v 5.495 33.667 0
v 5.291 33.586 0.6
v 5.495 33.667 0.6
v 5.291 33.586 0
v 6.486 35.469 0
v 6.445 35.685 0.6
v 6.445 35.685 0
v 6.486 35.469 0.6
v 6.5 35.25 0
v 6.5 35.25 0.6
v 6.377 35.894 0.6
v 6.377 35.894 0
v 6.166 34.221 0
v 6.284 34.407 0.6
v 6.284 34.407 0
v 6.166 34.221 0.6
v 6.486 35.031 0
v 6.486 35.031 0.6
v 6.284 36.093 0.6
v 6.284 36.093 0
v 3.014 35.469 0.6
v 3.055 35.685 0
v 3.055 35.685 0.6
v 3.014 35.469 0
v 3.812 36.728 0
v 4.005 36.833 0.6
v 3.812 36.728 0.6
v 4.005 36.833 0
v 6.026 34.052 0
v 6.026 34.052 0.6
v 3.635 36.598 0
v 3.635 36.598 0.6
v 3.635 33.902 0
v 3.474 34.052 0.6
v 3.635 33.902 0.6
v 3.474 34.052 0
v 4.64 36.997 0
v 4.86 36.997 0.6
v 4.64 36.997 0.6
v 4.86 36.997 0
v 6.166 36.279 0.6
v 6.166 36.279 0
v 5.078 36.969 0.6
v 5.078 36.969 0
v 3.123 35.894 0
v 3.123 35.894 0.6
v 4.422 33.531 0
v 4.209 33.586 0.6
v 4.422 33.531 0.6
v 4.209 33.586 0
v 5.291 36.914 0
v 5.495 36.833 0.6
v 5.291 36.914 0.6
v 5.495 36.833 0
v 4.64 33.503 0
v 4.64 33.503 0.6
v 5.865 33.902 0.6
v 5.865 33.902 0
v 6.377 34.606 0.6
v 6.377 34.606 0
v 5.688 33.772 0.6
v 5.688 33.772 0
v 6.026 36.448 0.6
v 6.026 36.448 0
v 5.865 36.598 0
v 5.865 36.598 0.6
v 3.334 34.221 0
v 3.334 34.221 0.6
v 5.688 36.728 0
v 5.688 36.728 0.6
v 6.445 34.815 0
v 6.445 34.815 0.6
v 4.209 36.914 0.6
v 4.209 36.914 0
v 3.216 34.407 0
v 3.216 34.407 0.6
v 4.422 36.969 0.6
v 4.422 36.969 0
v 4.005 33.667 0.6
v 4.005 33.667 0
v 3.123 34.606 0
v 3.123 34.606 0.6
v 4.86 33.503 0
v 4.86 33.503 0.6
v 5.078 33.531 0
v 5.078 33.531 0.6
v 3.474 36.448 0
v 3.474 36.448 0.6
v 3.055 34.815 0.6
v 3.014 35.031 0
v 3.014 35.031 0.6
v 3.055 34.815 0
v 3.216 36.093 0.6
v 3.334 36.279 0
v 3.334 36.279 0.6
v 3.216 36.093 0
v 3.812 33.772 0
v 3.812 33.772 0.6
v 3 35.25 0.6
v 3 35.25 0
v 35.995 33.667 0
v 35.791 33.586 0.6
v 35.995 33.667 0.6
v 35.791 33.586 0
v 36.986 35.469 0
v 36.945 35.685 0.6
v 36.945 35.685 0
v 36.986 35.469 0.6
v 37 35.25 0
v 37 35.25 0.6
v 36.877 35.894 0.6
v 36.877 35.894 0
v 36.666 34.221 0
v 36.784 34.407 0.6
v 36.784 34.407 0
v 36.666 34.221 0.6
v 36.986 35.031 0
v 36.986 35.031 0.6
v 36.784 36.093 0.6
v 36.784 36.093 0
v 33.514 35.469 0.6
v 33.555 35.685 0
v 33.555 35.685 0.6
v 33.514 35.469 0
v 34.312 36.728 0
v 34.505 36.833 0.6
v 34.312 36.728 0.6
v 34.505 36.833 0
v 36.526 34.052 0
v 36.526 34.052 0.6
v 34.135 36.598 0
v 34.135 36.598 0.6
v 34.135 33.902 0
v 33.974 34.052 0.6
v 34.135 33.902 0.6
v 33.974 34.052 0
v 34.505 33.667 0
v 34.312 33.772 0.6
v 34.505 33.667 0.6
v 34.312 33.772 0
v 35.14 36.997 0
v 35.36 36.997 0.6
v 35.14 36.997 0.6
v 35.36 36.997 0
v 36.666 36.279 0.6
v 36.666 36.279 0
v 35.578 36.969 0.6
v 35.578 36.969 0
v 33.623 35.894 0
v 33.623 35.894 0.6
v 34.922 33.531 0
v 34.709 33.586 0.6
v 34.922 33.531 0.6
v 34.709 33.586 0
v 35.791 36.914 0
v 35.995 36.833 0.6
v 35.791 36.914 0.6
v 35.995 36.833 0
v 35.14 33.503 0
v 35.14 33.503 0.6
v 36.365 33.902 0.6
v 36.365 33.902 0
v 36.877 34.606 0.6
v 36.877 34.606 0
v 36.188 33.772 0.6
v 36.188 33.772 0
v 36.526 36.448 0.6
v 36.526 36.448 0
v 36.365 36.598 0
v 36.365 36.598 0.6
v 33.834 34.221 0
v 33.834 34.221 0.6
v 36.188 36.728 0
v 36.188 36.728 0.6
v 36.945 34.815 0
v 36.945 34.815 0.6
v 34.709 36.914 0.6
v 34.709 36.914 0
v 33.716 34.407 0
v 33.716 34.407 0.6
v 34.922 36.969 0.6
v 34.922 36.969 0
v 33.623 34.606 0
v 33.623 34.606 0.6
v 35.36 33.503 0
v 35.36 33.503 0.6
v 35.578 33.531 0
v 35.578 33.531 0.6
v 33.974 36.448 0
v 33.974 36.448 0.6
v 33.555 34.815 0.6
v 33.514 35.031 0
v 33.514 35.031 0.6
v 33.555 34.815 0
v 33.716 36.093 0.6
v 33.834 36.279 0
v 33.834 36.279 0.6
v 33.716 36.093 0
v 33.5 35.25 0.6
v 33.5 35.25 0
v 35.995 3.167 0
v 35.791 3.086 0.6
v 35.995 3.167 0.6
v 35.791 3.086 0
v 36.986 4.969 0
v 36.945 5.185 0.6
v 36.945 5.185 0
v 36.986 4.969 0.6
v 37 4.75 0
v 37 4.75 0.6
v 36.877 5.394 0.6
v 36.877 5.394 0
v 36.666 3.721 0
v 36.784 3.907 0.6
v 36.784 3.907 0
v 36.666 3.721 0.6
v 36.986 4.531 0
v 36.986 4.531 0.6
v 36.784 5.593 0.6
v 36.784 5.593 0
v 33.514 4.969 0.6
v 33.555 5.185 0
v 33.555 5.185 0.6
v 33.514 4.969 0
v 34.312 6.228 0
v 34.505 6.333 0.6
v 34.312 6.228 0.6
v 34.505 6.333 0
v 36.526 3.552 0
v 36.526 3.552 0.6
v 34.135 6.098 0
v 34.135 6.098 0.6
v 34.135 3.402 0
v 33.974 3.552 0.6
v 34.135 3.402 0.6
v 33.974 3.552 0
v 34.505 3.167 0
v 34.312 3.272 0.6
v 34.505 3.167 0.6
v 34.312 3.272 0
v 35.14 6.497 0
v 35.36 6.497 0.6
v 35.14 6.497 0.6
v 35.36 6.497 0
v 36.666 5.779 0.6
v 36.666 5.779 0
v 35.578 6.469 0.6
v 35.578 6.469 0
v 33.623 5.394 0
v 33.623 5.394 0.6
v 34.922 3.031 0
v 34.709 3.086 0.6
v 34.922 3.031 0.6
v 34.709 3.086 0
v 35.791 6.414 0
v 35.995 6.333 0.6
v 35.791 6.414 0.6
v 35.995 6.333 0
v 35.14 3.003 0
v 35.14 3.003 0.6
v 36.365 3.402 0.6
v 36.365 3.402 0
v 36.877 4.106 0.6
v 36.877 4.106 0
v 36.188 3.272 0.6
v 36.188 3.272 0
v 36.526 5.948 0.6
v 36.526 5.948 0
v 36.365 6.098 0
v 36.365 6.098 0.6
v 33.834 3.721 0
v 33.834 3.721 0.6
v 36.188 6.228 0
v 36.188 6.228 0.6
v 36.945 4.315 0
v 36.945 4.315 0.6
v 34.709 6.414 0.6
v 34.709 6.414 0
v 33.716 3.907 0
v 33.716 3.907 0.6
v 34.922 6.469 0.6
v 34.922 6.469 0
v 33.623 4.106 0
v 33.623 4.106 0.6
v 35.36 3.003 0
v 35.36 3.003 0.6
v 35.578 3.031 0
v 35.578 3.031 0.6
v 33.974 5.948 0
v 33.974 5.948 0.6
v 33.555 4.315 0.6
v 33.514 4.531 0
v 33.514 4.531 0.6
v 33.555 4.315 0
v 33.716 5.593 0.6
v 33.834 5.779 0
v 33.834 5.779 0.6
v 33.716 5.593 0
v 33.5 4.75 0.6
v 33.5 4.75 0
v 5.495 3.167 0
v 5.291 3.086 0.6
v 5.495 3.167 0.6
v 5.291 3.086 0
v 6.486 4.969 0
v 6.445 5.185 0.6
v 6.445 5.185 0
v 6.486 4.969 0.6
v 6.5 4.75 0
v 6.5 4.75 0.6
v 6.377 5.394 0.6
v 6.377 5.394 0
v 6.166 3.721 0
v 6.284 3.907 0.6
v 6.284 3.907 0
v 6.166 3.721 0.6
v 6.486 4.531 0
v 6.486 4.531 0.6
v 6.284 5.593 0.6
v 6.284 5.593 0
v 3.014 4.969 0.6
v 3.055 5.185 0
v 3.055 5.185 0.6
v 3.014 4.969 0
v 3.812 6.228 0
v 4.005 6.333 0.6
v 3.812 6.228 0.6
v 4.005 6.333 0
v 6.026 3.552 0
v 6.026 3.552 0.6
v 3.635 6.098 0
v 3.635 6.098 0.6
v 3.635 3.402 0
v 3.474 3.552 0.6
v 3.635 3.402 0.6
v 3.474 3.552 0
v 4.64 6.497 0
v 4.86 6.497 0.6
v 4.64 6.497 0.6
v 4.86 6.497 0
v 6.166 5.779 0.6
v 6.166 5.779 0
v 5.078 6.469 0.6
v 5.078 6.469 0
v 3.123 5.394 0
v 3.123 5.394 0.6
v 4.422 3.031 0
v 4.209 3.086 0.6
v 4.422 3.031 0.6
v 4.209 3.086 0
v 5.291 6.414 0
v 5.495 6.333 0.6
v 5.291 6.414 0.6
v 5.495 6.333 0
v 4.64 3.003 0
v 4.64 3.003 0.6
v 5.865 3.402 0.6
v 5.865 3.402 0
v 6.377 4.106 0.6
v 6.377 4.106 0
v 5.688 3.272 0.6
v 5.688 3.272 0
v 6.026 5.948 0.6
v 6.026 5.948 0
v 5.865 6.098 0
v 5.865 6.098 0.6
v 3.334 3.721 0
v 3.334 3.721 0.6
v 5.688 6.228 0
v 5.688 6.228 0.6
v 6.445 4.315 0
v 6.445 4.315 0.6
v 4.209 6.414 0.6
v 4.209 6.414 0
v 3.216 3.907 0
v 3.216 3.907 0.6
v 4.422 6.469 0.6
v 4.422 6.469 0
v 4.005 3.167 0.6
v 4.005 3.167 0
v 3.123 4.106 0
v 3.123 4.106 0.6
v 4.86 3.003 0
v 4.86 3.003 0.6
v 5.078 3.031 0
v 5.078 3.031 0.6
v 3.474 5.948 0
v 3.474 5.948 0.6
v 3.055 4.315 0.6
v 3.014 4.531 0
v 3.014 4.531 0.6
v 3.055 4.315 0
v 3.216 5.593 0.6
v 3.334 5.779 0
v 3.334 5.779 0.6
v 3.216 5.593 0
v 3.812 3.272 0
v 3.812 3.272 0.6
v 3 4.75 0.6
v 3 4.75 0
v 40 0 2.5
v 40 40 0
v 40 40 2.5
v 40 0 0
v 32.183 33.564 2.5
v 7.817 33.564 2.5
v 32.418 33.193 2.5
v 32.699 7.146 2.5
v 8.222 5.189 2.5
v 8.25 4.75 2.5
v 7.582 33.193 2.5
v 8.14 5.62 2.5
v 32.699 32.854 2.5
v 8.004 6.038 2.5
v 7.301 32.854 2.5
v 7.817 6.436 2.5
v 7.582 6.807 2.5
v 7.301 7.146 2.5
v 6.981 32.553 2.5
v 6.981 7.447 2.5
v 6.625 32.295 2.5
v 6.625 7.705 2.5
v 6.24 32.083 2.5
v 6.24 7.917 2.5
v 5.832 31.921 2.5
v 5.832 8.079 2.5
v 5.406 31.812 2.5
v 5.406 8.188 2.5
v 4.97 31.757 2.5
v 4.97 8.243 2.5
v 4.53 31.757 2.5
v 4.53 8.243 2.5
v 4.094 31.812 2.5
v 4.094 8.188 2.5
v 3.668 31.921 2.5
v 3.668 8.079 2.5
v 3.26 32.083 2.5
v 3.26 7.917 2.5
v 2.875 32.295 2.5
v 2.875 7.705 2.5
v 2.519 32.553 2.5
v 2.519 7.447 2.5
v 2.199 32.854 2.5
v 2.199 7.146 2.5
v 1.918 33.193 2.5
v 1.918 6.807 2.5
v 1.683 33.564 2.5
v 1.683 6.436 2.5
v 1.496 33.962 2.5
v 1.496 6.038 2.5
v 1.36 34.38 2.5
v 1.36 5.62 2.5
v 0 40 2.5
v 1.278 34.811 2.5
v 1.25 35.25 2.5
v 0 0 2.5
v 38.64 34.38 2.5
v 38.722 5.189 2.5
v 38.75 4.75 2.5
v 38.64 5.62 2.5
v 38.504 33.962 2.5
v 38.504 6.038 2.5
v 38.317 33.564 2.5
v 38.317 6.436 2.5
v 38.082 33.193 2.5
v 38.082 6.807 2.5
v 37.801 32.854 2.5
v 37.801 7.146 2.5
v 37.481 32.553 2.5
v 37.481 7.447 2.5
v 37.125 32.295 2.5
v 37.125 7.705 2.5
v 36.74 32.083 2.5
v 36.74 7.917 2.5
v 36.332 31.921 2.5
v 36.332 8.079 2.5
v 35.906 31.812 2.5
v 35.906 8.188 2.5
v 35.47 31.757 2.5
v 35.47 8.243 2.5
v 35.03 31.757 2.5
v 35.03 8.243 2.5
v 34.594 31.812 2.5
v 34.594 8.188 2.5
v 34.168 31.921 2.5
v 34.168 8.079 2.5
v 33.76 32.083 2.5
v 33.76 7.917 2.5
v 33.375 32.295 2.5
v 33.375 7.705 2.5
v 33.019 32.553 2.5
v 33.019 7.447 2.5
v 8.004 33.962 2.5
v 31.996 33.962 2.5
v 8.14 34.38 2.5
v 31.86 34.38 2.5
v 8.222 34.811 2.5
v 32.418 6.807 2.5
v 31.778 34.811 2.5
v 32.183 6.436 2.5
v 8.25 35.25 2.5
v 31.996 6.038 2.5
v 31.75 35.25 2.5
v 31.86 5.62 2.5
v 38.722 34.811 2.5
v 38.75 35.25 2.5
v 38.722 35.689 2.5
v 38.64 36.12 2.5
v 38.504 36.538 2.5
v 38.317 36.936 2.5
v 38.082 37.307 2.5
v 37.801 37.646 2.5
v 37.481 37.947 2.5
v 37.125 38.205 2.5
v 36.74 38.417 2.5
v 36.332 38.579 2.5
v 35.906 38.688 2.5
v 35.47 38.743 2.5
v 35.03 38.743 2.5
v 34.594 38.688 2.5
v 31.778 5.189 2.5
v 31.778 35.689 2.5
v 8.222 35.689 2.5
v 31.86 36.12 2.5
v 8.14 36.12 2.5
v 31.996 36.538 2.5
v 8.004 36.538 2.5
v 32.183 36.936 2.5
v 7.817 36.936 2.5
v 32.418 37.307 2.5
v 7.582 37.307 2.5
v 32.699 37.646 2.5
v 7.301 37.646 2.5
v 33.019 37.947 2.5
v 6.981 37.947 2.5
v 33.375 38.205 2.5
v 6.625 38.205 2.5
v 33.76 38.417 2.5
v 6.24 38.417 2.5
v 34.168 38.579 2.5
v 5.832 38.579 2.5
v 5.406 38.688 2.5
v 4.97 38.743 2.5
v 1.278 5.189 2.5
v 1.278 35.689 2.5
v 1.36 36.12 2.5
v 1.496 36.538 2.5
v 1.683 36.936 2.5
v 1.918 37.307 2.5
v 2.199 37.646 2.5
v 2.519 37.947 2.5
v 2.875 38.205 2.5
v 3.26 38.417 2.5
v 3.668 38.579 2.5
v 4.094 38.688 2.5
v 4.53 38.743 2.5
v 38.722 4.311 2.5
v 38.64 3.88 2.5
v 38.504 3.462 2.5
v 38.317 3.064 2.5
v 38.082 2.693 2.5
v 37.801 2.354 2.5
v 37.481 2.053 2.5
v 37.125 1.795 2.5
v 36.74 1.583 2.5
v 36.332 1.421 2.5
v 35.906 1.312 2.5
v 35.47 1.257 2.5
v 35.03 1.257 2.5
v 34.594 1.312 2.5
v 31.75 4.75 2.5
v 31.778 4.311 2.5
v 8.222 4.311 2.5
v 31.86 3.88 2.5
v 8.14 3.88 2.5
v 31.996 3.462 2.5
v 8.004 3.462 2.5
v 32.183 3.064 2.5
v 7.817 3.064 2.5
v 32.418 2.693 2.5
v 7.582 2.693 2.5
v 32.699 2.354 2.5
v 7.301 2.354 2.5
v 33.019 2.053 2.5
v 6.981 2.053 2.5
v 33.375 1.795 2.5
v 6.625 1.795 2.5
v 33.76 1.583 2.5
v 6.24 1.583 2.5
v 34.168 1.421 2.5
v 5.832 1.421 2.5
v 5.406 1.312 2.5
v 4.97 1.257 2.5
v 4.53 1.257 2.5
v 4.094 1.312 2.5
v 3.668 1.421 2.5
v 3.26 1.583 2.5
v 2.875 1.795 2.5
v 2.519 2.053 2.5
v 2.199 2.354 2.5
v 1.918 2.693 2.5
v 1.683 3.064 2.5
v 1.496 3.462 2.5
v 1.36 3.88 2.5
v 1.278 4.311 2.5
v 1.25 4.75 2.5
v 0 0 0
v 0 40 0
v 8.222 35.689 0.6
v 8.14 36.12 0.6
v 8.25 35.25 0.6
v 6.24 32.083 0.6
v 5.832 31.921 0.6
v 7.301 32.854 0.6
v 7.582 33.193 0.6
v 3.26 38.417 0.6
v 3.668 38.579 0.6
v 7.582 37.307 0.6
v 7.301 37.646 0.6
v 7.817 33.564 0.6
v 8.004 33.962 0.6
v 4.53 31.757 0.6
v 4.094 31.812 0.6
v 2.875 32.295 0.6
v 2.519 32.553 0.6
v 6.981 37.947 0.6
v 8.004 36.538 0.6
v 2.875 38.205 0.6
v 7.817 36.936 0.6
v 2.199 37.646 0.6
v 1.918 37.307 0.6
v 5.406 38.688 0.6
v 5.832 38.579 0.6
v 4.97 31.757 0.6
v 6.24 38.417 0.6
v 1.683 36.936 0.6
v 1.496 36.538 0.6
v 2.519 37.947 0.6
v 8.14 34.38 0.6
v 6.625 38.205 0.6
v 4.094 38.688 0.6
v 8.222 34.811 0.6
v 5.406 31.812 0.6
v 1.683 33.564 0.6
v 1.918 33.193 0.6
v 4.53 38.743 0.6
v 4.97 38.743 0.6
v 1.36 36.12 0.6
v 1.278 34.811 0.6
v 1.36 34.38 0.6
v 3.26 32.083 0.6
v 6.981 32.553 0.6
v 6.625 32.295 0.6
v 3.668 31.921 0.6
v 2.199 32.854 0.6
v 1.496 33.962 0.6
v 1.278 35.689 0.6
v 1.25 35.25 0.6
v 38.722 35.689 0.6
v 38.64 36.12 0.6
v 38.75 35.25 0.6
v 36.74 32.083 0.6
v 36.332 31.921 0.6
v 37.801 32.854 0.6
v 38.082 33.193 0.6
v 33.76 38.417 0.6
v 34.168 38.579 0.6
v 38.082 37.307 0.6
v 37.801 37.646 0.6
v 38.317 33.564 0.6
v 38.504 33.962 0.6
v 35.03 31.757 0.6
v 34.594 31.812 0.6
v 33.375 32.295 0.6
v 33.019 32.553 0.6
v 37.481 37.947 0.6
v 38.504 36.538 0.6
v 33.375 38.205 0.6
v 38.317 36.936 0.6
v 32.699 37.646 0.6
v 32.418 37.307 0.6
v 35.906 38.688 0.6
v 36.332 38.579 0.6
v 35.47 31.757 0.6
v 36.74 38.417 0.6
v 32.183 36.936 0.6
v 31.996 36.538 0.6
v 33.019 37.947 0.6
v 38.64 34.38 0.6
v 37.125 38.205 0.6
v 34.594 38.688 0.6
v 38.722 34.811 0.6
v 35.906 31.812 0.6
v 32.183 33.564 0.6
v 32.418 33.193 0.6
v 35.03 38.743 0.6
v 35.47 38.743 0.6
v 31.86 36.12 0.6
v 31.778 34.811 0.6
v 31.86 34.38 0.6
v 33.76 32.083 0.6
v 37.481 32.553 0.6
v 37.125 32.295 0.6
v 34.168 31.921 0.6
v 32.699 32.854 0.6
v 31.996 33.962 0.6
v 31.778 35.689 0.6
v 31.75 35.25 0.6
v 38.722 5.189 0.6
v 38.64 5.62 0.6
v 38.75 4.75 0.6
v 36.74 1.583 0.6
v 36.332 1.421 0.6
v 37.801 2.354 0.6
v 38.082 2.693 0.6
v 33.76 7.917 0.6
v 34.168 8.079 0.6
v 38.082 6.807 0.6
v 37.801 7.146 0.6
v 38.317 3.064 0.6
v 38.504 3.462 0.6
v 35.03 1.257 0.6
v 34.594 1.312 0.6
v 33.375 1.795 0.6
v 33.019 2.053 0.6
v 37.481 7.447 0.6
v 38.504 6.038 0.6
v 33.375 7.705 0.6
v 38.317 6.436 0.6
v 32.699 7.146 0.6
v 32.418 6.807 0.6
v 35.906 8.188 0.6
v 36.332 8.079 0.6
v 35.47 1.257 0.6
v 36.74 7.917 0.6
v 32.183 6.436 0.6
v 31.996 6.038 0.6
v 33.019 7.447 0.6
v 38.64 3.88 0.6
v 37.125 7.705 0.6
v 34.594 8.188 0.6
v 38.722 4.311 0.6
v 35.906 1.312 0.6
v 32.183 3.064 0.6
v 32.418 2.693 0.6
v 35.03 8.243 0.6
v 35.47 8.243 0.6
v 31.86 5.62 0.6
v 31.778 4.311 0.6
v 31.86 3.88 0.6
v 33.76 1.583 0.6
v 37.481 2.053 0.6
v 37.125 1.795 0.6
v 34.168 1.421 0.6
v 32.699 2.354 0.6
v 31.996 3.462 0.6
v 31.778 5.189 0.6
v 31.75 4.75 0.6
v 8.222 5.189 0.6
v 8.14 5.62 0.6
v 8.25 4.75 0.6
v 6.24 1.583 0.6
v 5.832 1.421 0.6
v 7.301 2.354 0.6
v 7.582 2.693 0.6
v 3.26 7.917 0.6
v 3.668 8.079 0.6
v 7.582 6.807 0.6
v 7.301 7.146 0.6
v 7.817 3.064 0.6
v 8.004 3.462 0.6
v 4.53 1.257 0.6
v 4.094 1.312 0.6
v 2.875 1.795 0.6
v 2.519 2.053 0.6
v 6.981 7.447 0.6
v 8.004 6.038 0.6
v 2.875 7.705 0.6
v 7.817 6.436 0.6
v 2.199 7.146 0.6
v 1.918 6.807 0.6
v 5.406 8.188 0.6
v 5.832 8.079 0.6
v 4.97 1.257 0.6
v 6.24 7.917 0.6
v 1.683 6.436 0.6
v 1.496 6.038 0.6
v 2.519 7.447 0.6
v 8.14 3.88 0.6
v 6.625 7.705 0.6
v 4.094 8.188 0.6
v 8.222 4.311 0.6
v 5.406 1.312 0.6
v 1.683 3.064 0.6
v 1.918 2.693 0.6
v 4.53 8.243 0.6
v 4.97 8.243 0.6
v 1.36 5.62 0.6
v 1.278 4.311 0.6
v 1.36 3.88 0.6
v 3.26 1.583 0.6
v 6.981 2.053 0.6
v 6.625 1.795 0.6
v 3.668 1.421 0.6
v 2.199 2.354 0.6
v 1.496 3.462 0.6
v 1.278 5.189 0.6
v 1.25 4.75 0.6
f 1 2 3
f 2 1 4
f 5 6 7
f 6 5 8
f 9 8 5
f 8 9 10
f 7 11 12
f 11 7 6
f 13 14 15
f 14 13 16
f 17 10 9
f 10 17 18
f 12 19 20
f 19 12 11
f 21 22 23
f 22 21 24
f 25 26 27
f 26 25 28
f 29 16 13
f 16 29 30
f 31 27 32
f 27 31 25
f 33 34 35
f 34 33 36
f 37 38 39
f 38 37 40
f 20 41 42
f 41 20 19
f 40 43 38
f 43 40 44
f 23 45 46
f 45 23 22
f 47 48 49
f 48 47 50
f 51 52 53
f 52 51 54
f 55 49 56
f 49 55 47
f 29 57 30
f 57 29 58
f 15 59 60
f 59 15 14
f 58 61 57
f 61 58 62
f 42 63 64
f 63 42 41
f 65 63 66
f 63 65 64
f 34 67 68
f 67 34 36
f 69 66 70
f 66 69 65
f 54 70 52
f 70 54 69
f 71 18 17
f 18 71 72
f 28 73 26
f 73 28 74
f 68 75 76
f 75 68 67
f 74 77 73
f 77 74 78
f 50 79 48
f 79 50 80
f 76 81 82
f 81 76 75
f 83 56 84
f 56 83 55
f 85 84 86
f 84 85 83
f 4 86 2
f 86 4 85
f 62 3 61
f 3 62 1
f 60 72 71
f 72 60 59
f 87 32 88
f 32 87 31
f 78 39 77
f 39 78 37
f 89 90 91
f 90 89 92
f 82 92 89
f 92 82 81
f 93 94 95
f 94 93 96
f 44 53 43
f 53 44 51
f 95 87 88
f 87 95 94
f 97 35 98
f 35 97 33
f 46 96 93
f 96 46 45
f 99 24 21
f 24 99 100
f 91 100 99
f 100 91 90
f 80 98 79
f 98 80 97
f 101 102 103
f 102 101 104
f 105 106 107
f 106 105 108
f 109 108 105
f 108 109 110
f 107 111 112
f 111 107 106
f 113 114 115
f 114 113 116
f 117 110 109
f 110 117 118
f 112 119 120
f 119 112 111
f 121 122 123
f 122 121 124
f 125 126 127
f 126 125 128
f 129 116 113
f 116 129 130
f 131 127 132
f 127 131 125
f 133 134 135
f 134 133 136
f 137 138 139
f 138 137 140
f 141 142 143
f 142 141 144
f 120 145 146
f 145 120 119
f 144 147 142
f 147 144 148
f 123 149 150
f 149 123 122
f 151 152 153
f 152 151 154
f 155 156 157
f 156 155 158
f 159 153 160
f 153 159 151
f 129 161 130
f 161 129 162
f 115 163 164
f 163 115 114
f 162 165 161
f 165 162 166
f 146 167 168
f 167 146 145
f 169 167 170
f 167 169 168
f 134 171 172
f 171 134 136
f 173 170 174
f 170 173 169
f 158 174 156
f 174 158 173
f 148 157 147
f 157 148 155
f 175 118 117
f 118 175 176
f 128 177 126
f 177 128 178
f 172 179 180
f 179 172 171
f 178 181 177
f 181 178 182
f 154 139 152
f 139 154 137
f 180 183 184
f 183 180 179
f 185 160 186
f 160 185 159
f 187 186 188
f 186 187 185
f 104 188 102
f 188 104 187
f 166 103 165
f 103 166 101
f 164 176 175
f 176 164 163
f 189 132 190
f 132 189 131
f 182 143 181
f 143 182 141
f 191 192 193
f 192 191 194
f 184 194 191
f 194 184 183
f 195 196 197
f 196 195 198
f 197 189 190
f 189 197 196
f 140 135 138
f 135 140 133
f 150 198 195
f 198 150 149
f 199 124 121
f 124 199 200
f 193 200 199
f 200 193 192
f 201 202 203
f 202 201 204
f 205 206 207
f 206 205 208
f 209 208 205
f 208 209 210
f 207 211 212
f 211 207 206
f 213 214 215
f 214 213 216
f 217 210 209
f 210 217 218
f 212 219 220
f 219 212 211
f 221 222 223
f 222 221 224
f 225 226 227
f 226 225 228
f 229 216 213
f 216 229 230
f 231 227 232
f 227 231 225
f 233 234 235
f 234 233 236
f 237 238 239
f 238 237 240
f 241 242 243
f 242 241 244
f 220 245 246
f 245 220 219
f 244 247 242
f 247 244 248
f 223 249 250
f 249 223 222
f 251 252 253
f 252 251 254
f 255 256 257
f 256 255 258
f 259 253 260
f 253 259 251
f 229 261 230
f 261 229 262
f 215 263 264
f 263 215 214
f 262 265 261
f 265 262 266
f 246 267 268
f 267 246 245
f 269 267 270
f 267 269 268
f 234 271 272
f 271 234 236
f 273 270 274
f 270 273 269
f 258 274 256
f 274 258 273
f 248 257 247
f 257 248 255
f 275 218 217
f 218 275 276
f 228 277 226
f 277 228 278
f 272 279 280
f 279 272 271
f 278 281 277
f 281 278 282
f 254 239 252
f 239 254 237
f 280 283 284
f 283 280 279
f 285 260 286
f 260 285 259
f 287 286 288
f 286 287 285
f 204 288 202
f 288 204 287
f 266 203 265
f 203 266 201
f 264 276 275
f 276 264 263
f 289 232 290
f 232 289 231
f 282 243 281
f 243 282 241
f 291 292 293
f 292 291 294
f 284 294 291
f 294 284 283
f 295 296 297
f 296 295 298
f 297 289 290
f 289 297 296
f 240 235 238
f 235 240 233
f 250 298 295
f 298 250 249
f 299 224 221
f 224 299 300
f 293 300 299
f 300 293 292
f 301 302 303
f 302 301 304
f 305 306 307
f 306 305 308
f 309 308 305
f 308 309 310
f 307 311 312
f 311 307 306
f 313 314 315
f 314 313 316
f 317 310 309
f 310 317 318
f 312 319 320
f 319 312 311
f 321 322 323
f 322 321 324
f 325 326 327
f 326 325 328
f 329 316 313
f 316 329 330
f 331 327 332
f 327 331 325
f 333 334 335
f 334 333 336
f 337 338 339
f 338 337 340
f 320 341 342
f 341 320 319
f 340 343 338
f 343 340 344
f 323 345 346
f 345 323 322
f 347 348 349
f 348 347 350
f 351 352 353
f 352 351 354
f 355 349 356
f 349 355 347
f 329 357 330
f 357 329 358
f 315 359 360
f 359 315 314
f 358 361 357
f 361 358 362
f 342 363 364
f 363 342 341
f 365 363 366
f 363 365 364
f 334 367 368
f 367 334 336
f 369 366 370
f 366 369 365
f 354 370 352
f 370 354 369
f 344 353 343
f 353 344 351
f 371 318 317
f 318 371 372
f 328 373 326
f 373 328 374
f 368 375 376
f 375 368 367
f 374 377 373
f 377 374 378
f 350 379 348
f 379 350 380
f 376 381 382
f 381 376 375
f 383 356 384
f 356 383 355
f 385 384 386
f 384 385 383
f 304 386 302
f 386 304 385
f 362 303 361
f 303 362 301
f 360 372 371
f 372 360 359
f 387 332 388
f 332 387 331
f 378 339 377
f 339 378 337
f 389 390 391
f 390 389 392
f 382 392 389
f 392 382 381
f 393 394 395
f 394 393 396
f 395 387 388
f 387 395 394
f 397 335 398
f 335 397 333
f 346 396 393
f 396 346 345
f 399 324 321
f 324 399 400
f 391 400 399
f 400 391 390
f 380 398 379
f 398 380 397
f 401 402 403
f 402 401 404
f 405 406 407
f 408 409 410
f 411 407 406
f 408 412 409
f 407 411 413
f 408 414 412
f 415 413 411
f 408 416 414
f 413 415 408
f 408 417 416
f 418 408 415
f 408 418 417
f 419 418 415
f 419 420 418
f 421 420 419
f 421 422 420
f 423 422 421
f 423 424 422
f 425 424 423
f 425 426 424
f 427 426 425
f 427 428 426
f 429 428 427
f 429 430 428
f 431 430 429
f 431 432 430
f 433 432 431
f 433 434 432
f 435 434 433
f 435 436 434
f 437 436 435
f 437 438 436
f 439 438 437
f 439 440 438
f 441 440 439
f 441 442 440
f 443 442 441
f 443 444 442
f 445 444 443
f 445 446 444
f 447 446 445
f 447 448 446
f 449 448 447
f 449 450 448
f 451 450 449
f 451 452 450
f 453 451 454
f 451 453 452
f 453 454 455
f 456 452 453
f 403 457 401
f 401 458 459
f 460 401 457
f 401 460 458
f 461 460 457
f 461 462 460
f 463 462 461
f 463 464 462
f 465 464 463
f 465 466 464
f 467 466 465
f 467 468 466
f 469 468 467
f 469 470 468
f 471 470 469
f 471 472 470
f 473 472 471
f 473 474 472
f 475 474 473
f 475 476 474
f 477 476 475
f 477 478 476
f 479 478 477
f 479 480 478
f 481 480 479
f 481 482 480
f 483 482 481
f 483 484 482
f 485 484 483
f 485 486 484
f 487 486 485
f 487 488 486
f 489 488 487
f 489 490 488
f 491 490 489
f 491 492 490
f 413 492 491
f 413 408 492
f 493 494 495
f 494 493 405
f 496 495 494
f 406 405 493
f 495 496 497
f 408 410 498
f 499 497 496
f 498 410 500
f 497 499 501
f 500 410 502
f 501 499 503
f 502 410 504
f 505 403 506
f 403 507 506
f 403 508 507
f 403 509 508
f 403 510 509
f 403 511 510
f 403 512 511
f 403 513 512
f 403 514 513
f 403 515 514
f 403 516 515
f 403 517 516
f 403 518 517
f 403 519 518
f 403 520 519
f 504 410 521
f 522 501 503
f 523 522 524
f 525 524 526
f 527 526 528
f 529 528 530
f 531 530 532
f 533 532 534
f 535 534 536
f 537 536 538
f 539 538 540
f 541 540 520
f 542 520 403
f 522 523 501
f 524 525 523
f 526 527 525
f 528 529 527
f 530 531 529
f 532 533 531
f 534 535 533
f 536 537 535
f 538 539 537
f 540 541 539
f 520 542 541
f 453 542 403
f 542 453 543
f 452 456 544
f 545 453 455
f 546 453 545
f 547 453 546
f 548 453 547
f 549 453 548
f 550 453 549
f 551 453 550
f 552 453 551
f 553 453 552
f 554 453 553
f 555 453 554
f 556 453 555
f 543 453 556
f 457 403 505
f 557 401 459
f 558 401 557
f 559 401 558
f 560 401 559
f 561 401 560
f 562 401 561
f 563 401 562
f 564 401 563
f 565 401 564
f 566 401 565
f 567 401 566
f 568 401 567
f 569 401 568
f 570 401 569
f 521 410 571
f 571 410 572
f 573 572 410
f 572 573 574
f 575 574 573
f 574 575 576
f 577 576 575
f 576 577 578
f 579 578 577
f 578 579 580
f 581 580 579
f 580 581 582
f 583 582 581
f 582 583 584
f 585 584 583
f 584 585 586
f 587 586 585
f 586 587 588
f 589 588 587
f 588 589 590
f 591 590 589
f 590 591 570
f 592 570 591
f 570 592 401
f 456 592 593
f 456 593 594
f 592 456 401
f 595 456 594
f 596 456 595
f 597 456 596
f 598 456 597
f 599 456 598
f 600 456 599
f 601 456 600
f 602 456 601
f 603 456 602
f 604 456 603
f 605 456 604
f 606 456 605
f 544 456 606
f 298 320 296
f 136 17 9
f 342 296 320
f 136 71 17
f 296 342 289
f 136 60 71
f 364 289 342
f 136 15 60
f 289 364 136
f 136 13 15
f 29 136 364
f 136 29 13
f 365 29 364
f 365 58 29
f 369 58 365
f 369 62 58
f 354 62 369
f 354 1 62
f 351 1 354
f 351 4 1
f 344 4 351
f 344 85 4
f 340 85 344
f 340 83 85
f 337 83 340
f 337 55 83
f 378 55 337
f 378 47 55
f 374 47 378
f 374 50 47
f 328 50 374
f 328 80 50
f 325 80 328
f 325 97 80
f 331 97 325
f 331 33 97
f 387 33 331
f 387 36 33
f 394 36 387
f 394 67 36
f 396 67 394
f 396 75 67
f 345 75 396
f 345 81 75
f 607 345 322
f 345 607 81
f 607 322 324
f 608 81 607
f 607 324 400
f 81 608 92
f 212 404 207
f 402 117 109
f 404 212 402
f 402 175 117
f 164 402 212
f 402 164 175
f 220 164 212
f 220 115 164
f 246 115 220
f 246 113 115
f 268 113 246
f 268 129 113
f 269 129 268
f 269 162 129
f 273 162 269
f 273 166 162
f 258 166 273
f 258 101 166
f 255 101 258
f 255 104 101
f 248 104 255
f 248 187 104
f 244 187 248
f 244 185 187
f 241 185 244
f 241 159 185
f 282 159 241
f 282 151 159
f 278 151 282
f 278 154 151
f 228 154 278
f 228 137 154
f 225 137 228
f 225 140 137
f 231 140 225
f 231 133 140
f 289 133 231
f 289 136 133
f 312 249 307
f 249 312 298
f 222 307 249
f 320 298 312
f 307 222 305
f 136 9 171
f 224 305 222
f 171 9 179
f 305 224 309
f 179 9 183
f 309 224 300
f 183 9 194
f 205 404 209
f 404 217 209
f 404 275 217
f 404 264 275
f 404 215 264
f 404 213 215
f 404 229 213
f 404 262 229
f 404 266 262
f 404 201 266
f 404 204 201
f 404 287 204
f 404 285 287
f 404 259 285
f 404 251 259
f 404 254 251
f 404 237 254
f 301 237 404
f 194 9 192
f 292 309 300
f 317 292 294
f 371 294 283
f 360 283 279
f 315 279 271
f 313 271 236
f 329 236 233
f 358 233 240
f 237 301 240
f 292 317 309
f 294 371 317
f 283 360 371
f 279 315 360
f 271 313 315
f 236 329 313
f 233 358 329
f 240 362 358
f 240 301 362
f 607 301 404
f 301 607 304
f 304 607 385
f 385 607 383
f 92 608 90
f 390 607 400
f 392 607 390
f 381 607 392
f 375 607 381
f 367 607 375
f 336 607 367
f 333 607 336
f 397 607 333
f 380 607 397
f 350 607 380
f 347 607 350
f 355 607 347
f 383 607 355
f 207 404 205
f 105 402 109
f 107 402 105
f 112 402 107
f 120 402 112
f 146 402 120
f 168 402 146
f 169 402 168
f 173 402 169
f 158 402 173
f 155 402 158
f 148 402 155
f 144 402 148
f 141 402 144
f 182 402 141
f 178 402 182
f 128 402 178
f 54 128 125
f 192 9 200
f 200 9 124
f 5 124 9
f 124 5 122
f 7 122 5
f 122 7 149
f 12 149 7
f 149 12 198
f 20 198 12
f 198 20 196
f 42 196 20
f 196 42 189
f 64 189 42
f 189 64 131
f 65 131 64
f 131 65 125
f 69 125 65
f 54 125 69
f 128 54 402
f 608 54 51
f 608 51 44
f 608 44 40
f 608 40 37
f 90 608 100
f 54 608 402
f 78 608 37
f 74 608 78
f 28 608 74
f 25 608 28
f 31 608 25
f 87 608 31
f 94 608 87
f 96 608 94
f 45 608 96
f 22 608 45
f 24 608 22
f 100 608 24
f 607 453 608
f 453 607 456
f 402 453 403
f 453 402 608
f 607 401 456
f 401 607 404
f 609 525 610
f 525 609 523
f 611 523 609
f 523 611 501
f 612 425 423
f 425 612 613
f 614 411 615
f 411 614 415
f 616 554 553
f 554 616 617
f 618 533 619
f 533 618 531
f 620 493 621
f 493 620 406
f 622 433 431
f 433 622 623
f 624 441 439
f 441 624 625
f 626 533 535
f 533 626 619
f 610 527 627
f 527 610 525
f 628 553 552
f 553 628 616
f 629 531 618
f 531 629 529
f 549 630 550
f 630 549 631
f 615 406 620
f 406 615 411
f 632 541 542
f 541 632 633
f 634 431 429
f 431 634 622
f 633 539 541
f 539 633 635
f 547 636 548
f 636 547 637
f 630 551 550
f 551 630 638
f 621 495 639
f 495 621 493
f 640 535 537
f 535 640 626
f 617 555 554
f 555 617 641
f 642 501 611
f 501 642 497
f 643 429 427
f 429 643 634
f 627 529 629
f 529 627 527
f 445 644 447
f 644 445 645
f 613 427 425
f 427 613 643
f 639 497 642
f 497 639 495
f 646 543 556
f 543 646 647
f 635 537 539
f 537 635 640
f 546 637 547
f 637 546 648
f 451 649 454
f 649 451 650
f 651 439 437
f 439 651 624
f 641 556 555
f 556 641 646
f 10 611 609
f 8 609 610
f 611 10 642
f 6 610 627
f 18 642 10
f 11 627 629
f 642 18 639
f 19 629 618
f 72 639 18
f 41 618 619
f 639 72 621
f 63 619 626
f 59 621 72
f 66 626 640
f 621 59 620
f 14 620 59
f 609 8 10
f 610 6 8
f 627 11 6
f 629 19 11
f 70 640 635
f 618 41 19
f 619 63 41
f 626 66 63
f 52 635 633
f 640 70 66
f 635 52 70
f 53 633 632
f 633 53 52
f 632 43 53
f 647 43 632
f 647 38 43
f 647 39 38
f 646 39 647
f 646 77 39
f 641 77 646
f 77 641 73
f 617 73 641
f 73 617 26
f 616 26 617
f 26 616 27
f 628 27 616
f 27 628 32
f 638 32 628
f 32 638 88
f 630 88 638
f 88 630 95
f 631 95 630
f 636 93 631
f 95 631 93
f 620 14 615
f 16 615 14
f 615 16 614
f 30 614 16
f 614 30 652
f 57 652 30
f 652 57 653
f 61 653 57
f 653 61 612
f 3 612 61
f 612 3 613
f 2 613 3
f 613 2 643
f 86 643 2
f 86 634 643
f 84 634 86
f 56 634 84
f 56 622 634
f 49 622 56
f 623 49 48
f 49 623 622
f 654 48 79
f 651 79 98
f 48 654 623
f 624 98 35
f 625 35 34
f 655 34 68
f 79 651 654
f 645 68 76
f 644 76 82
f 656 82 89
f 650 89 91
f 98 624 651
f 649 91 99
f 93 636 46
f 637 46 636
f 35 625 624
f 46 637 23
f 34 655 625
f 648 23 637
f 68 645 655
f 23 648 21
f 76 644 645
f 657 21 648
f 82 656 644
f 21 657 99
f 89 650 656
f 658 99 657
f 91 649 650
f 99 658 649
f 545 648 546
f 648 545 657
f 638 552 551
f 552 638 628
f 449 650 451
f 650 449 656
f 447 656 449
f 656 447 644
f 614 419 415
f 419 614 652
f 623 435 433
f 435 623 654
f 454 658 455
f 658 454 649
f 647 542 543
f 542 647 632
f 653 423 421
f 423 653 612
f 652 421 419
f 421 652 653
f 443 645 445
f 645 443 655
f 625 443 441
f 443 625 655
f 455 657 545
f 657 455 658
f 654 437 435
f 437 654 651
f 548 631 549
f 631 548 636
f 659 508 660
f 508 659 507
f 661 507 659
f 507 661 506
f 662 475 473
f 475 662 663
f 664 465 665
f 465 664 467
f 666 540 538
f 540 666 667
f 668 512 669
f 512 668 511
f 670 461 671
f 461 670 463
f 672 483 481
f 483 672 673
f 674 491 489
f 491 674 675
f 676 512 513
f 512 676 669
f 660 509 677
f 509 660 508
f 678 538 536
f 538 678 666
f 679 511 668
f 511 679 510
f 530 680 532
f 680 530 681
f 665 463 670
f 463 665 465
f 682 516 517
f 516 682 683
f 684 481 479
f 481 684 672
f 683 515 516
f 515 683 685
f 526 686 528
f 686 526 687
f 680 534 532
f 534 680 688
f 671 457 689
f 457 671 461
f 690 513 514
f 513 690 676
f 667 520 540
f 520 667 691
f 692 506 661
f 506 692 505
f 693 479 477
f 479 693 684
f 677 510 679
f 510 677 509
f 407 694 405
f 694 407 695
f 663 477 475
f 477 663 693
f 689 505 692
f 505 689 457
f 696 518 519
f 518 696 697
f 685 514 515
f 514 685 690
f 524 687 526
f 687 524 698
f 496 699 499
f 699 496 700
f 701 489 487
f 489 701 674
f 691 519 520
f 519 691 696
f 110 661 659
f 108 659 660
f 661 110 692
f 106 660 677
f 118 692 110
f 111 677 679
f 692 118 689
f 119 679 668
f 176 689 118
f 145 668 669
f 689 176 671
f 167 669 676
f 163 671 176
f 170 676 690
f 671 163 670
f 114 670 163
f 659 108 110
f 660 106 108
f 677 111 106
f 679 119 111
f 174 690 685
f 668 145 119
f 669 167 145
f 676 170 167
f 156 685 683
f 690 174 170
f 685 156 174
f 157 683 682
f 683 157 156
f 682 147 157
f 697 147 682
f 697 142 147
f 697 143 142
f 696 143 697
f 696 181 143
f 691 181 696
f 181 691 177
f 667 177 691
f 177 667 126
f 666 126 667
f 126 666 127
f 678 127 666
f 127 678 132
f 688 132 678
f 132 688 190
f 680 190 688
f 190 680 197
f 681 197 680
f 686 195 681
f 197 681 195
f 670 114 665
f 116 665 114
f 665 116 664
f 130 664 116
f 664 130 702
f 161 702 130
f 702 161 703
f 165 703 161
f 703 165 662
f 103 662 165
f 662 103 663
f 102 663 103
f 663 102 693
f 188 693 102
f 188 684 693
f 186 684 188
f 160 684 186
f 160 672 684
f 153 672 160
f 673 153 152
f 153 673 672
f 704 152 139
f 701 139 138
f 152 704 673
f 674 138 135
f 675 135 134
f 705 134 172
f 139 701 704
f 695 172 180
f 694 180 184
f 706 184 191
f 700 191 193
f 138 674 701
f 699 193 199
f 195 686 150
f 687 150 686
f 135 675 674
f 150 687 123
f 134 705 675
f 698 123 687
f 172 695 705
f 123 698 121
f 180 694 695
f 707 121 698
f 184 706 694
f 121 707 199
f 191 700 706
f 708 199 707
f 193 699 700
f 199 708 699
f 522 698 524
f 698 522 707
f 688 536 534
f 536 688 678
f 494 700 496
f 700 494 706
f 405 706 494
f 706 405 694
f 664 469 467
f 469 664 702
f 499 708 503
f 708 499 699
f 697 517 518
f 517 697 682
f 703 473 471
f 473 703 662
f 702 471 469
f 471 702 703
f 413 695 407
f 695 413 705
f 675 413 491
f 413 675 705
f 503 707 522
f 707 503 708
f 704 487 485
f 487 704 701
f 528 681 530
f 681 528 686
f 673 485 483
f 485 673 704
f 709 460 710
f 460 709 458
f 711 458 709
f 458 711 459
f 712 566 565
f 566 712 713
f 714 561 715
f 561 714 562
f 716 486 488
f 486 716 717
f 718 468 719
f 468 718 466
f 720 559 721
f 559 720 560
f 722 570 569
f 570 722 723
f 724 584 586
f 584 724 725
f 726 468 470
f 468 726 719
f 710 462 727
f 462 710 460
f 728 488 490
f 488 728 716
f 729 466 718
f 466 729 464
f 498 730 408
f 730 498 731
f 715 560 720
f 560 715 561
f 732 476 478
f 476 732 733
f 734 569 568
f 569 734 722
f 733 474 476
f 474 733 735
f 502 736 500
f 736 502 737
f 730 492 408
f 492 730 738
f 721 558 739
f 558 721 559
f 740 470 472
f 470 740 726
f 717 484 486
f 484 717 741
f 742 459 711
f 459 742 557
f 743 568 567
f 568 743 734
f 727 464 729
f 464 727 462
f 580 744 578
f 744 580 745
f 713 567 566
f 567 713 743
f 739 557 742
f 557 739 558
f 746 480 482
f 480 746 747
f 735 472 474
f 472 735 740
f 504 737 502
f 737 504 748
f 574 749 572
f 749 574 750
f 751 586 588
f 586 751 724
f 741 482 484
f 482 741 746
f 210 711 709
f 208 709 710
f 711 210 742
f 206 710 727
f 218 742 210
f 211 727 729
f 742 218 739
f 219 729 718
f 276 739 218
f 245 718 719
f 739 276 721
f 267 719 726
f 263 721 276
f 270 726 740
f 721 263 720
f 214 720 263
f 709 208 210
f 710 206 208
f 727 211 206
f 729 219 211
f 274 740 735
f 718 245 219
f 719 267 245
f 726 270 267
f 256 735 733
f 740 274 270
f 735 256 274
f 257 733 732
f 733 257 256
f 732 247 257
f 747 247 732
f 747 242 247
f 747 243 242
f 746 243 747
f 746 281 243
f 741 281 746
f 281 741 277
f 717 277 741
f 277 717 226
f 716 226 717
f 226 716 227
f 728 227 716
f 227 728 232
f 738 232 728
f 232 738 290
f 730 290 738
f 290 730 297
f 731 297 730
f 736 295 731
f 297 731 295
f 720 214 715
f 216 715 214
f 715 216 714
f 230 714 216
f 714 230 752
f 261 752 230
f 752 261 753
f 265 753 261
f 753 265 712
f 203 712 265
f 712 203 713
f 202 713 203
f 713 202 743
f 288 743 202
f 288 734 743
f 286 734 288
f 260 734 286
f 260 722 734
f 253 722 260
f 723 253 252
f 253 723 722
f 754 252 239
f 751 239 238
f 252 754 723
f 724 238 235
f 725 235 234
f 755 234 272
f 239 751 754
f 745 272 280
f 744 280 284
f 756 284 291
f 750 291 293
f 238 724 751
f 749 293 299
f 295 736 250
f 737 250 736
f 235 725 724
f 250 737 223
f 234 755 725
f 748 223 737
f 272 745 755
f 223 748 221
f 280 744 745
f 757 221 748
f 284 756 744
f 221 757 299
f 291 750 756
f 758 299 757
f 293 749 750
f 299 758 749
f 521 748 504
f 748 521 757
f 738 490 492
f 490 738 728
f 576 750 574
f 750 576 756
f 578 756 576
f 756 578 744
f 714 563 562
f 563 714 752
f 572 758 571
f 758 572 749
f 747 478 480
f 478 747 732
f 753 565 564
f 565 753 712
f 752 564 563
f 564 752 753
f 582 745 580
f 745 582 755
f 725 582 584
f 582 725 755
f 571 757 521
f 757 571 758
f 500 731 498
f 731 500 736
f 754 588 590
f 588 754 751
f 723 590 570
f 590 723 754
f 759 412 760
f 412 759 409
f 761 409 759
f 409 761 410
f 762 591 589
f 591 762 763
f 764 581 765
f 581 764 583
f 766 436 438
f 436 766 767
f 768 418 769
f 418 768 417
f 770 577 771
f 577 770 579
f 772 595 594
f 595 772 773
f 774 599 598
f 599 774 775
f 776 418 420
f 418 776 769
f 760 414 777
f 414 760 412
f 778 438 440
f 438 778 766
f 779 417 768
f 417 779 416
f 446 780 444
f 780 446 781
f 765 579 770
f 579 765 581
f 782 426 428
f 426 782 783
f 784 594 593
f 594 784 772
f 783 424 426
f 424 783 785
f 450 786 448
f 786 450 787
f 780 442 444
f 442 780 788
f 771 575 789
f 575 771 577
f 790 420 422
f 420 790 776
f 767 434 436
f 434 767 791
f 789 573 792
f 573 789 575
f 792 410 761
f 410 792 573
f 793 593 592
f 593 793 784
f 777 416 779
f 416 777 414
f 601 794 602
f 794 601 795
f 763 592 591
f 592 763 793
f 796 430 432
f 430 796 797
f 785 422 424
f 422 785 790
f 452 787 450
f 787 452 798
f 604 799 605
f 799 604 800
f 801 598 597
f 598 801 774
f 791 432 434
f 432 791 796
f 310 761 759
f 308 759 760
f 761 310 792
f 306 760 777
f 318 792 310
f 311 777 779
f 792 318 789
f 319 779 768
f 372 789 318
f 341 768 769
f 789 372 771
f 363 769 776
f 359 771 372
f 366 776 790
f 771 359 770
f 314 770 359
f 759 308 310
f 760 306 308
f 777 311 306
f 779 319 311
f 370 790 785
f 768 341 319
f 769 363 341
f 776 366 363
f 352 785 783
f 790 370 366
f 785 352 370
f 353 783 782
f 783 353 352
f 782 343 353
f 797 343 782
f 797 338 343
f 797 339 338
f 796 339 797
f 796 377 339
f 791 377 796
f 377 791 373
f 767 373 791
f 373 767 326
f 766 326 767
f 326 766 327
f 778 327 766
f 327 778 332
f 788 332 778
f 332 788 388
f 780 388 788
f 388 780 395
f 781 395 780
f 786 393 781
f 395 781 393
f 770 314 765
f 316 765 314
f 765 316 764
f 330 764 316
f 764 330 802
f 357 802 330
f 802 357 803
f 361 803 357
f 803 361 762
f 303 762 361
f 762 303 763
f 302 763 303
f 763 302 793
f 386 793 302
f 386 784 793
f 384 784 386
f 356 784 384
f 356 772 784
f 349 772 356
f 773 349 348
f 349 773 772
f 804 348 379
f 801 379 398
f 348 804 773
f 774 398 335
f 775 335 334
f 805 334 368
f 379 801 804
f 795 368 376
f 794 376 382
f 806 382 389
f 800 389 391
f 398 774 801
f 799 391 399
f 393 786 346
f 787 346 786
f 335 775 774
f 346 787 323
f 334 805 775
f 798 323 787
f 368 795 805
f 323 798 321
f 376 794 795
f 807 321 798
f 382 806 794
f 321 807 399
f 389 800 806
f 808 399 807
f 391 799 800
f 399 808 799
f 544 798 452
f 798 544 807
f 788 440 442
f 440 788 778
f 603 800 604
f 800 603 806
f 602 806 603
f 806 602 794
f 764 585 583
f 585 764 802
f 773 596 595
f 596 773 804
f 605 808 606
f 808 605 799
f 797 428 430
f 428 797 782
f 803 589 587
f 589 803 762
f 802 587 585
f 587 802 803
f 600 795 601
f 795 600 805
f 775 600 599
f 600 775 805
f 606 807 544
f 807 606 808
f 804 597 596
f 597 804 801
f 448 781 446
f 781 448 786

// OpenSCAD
// The height of the spacer
height = 2.5; // [2.5:0.5:5]

// Through-hole or retained by screws?
retain = 1; // [0:Through-hole, 1:Retained]

module screw_hole_big() {
    cylinder(d=7, h=2+height, $fn=50);
}

module screw_hole_small() {
    cylinder(d=3.5, h=2+height, $fn=50);
}

difference() {
    hole_height = retain ? 0.6 : -1;
    cube([40, 40, height], center=false);
    {
        translate([4.75, 35.25, hole_height]) screw_hole_big();
        translate([35.25, 35.25, hole_height]) screw_hole_big();
        translate([35.25, 4.75, hole_height]) screw_hole_big();
        translate([4.75, 4.75, hole_height]) screw_hole_big();
    }
    if (retain) {
        translate([4.75, 35.25, -1]) screw_hole_small();
        translate([35.25, 35.25, -1]) screw_hole_small();
        translate([35.25, 4.75, -1]) screw_hole_small();
        translate([4.75, 4.75, -1]) screw_hole_small();
    }
};
